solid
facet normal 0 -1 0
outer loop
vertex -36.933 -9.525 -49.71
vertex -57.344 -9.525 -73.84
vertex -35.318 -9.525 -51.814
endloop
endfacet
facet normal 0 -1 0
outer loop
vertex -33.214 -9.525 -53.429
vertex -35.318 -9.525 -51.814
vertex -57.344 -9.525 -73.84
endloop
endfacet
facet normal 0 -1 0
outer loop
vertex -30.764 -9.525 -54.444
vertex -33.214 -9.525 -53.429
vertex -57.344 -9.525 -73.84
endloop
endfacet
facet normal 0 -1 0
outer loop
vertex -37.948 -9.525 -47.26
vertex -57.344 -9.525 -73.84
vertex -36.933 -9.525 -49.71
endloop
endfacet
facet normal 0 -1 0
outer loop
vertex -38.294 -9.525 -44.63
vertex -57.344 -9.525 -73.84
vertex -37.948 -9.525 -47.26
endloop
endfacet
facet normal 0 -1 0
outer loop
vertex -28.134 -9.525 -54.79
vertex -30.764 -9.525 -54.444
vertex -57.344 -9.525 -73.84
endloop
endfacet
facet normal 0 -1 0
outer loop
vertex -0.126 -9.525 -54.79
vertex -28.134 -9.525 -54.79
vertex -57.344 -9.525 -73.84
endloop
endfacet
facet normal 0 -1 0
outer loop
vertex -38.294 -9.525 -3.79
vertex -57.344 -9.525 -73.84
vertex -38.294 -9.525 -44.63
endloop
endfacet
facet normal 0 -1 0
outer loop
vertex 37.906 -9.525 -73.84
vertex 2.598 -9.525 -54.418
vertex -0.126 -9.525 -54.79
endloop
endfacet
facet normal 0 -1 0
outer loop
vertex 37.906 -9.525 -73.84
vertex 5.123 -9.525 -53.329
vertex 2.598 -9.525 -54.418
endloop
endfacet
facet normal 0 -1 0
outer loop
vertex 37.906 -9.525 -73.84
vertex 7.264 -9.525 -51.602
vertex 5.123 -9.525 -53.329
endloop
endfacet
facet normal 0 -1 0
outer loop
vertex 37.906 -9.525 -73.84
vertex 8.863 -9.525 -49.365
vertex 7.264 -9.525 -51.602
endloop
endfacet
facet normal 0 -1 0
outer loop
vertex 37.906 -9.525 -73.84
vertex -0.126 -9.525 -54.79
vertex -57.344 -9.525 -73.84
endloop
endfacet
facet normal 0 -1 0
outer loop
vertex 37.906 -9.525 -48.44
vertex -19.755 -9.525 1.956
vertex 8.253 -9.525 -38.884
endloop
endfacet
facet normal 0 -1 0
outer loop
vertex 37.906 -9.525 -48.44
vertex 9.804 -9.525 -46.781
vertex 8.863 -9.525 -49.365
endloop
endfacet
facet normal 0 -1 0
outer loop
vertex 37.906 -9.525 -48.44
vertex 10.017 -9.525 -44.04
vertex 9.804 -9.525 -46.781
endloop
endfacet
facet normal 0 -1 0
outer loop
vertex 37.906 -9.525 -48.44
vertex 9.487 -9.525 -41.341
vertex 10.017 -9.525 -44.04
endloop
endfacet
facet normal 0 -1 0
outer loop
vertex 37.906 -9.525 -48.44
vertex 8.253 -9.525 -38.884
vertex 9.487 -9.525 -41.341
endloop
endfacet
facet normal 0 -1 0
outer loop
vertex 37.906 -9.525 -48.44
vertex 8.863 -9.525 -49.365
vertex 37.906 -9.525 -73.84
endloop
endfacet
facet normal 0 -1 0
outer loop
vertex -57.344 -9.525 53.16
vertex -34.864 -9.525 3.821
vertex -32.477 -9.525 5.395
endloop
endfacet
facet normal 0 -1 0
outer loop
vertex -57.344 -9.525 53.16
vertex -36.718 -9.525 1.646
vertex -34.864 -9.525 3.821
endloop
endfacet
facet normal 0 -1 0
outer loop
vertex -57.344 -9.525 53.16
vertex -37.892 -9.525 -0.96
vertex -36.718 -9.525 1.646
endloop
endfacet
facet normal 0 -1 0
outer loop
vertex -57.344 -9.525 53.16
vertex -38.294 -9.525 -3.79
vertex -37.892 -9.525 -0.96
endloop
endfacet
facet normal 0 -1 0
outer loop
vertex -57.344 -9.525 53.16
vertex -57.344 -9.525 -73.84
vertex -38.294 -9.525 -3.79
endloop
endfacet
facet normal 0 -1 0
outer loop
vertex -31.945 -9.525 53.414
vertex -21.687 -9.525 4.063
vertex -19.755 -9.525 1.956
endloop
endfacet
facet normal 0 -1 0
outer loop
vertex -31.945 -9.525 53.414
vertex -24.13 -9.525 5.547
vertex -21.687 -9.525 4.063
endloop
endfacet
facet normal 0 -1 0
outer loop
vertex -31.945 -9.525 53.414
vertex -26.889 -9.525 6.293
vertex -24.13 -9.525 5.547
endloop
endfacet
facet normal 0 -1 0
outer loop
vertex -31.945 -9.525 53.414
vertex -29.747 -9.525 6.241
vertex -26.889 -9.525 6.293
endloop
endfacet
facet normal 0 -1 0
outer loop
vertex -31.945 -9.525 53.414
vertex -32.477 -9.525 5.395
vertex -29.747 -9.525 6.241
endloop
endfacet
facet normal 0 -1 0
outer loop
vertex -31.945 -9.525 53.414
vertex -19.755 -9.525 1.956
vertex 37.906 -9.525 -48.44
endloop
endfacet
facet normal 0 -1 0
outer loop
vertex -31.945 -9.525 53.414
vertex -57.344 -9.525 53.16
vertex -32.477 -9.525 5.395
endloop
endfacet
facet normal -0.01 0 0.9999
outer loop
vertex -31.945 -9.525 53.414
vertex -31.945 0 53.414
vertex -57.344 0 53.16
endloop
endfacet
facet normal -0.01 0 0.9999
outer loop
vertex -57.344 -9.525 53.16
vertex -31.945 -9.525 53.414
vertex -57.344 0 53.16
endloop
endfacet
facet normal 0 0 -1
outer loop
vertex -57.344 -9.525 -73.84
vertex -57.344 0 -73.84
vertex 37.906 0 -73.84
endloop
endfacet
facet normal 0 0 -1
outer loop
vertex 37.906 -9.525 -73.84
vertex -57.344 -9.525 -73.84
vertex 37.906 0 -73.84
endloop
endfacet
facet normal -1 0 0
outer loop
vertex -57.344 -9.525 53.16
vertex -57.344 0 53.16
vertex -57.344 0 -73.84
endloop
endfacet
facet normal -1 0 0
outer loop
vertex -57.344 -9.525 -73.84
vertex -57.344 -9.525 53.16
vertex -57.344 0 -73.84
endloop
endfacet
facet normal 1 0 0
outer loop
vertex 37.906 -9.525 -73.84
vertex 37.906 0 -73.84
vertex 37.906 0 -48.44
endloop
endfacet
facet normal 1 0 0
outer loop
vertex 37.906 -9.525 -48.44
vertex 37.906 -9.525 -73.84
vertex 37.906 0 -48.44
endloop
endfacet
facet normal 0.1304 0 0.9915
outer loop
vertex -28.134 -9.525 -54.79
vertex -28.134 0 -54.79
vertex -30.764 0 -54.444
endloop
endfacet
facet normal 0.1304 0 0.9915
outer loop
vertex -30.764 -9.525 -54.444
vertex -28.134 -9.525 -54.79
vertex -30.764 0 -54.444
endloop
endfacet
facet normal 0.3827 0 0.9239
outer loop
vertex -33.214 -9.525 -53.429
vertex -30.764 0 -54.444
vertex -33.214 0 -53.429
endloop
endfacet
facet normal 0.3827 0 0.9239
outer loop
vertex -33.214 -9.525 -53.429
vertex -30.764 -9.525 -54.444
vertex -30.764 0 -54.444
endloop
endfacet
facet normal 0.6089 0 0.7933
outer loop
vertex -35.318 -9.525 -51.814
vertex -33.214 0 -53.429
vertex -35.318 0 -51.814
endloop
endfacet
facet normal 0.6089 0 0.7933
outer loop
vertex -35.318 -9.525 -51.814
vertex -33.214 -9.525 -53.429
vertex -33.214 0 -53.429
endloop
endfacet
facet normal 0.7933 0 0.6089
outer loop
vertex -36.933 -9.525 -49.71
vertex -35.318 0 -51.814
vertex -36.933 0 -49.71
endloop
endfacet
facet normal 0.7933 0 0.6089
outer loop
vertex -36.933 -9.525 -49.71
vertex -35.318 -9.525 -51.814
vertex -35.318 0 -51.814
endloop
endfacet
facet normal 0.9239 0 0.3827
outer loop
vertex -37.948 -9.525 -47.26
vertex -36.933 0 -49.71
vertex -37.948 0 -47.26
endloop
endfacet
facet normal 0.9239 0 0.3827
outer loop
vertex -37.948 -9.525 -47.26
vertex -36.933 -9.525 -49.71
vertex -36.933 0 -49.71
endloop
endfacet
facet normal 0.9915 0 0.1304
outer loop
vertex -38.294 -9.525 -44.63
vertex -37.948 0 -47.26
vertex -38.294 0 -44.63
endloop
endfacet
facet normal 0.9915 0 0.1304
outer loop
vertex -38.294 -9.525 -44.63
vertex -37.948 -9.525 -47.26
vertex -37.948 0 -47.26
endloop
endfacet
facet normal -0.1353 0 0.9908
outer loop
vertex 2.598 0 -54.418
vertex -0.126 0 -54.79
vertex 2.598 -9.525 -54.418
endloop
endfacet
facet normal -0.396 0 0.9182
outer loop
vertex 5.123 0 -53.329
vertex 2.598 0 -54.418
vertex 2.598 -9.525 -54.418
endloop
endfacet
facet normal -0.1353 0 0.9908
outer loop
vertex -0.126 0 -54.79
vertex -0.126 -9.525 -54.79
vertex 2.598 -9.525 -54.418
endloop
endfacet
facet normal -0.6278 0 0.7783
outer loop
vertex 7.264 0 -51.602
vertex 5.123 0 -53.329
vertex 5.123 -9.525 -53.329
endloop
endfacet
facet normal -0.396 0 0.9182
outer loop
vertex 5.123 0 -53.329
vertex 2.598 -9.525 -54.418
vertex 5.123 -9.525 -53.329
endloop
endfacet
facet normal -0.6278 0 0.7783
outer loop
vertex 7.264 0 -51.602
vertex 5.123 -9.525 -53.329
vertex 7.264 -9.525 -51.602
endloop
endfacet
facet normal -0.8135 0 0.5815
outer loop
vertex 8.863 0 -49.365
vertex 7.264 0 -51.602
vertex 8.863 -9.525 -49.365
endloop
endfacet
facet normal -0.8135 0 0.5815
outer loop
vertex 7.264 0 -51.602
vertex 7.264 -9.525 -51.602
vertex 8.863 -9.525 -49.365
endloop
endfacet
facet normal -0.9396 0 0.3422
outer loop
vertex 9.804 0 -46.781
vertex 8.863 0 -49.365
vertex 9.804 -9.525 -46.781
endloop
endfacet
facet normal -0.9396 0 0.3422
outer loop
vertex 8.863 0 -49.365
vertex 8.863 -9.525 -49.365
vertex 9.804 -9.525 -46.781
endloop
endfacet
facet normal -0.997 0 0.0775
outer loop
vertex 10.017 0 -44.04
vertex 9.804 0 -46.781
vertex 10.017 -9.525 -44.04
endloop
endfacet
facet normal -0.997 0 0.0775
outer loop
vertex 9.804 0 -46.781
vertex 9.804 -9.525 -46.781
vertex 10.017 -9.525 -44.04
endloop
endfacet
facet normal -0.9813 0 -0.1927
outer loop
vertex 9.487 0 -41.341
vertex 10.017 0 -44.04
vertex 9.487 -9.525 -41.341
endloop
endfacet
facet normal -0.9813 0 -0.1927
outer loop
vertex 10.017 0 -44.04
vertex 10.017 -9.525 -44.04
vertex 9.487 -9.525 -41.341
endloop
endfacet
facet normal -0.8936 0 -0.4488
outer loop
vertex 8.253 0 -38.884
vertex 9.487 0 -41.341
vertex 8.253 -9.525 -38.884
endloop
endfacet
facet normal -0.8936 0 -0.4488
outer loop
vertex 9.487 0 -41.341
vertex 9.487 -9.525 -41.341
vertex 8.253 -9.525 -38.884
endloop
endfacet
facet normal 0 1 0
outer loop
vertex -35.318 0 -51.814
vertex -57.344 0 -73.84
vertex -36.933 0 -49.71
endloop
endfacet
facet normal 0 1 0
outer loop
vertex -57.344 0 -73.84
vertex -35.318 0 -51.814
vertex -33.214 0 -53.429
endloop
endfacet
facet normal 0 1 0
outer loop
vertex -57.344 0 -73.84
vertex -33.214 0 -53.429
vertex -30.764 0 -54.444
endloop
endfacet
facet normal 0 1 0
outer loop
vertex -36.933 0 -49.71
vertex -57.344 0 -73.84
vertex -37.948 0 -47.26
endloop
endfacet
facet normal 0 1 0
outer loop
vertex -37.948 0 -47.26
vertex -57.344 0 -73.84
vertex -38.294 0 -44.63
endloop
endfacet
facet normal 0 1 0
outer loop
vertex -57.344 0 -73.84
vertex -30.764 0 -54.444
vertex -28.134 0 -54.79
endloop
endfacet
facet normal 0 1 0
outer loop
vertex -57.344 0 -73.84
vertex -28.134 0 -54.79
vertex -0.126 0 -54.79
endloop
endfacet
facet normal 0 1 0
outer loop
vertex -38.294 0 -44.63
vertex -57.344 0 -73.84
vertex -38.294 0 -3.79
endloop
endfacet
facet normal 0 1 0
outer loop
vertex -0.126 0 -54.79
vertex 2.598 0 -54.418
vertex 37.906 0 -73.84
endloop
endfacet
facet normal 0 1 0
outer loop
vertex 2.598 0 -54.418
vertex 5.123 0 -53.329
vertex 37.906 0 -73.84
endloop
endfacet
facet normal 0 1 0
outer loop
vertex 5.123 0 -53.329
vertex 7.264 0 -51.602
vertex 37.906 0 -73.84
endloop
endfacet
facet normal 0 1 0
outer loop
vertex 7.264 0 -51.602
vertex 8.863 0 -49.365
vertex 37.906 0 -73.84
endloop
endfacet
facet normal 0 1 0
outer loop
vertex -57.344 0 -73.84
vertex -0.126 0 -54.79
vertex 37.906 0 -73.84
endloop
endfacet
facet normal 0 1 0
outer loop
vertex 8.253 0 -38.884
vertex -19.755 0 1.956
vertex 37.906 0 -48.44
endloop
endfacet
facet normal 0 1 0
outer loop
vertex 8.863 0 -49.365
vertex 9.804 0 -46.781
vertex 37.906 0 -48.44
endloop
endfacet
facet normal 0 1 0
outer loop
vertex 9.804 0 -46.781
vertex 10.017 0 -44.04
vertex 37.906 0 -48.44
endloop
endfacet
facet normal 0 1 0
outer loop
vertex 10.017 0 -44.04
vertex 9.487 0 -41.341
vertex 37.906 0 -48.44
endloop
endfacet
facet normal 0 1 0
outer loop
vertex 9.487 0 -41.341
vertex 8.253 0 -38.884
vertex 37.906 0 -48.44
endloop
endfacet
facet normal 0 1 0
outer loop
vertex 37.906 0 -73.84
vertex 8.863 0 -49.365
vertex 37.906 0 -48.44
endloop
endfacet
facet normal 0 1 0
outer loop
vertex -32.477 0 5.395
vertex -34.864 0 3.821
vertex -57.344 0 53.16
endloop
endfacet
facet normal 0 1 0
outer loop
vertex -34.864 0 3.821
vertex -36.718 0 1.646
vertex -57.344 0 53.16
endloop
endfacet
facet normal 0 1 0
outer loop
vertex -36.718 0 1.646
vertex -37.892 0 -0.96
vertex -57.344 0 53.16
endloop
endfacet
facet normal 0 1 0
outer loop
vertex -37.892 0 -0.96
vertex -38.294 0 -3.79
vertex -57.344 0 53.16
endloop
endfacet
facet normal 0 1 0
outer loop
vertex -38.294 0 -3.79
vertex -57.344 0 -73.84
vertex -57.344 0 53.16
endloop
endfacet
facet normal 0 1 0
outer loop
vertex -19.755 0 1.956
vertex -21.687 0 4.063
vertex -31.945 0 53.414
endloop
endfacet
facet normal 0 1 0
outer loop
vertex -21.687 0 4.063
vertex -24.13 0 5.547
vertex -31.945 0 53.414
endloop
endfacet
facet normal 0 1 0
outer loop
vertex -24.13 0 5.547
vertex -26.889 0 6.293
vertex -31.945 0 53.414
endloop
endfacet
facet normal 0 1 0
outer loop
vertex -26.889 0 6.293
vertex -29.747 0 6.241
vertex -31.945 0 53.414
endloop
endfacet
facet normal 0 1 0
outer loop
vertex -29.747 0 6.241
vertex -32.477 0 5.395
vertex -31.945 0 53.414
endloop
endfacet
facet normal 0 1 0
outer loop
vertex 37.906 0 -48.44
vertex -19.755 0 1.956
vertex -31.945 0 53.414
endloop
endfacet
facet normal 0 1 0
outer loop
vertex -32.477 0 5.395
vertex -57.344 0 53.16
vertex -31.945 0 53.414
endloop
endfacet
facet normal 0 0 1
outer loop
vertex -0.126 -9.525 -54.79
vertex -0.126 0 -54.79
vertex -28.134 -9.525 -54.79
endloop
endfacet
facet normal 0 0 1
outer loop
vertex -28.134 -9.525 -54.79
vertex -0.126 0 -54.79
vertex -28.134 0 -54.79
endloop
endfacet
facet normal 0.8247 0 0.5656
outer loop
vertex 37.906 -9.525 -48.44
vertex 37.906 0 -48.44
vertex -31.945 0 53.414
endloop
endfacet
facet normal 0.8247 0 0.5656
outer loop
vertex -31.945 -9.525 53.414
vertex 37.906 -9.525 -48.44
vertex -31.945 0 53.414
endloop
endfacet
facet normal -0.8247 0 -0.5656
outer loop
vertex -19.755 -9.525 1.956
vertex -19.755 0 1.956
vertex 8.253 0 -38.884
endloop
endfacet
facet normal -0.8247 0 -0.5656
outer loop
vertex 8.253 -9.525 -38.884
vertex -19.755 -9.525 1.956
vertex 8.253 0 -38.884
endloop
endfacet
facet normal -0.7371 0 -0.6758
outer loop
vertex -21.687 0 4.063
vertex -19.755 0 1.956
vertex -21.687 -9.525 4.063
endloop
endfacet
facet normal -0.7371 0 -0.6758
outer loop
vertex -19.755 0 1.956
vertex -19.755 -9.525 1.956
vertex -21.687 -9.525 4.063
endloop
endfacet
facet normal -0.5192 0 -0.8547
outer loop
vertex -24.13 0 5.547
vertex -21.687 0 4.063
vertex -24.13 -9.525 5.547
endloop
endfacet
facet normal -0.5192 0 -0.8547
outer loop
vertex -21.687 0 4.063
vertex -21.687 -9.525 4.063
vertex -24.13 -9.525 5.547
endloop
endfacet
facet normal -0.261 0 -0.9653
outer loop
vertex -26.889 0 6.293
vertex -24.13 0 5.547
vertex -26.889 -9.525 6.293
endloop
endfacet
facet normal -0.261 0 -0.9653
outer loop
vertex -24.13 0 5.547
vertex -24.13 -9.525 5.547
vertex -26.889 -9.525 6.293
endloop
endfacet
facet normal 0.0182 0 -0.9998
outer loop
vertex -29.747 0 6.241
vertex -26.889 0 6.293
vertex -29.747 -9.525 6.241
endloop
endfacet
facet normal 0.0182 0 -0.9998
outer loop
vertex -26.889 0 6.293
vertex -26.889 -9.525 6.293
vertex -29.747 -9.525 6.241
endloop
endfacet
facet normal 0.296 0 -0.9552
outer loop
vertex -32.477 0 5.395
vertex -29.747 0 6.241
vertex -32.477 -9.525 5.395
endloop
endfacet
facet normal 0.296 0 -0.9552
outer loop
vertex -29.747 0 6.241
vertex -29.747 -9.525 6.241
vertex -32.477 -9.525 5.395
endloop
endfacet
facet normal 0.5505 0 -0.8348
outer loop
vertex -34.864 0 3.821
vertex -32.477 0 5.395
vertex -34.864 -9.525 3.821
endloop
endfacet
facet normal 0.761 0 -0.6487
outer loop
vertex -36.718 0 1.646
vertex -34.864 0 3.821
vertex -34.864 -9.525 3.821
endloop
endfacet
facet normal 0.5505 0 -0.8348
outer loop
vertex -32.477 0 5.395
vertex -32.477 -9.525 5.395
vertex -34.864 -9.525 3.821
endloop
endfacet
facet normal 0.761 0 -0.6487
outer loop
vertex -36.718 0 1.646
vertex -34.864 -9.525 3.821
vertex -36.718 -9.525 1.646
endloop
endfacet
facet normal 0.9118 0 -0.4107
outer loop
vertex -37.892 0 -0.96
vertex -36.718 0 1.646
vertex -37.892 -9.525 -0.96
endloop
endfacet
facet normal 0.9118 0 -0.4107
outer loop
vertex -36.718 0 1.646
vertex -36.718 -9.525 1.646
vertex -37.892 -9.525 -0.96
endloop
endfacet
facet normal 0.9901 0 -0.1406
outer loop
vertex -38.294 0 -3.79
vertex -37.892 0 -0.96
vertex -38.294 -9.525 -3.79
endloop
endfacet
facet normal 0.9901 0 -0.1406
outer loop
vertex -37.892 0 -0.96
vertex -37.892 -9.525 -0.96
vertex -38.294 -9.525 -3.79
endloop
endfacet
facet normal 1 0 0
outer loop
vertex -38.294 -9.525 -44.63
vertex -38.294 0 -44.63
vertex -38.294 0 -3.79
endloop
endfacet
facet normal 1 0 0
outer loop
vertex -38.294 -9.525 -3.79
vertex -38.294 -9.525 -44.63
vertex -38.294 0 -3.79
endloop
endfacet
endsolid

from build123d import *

# Parameters (mm, degrees)
F1_DEPTH = 9.525
F2_R     = 10.16


with BuildPart() as f1:
    # F0 (on Front) → F1 (new body)
    with BuildSketch(Plane.XZ):
        Polygon((-31.945355, 53.413631), (-57.344088, 53.159991), (-57.344088, -73.840009), (37.905912, -73.840009), (37.905912, -48.440009), align=None)
        Polygon((-38.294088, -54.790009), (-38.294088, 28.988602), (19.161316, -54.790009), align=None, mode=Mode.SUBTRACT)
    extrude(amount=F1_DEPTH)

    # F2
    f2_edges = [f1.edges().sort_by_distance(p)[0] for p in [
        (-38.294088, -4.7625, -54.790009),
        (19.161316, -4.7625, -54.790009),
        (-38.294088, -4.7625, 28.988602),
    ]]
    fillet(f2_edges, radius=F2_R)


solid = f1.part
